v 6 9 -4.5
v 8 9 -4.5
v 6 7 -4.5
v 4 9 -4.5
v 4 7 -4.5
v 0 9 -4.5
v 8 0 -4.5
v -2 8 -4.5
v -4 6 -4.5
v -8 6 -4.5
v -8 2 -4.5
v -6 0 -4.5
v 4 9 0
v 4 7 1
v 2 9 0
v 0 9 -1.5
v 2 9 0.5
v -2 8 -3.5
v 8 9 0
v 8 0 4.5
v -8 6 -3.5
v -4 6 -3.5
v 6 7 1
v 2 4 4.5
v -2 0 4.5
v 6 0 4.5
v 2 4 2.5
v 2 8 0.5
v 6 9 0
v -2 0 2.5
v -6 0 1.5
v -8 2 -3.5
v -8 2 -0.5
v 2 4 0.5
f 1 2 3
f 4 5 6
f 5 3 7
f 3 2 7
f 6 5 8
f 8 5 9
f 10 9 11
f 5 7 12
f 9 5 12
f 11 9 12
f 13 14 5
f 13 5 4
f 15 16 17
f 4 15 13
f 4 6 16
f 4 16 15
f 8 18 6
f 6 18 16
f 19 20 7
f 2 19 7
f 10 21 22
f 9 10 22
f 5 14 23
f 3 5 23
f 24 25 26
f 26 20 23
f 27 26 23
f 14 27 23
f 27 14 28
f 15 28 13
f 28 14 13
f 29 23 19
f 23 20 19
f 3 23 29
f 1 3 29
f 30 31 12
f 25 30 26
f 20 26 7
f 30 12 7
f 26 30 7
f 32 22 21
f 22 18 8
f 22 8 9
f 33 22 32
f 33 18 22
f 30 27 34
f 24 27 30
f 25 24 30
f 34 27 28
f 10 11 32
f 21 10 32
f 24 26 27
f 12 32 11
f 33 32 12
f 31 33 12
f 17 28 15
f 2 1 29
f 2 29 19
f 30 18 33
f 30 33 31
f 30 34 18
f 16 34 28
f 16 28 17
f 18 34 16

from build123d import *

# Parameters (mm, degrees)
BOSS_EXTRUDE1_DEPTH = 9
SKETCH2_W           = 2
SKETCH2_H           = 2
CUT_EXTRUDE1_DEPTH  = 9
CUT_EXTRUDE2_DEPTH  = 8
CUT_EXTRUDE3_DEPTH  = 8
CUT_EXTRUDE4_DEPTH  = 8
CUT_EXTRUDE5_DEPTH  = 8


with BuildPart() as part:
    # Sketch1 → Boss-Extrude1 (new body)
    with BuildSketch(Plane(origin=(0, 0, 0), x_dir=(1, 0, 0), z_dir=(0, 1, 0))):
        Polygon((-8, 4.5), (-8, 0.5), (-6, -1.5), (-2, -2.5), (-2, -4.5), (8, -4.5), (8, 4.5), align=None)
    extrude(amount=BOSS_EXTRUDE1_DEPTH)

    # Sketch2 → Cut-Extrude1 (cut)
    with BuildSketch(Plane.XY.offset(4.5)):
        with Locations((5, 8)):
            Rectangle(SKETCH2_W, SKETCH2_H)
        Polygon((-8, 6), (-4, 6), (-2, 8), (0, 9), (-8, 9), align=None)
        Polygon((-8, 2), (-6, 0), (-8, 0), align=None)
    extrude(amount=-CUT_EXTRUDE1_DEPTH, mode=Mode.SUBTRACT)

    # Sketch4 → Cut-Extrude2 (cut)
    with BuildSketch(Plane.XY.offset(4.5)):
        Polygon((-4, 6), (-8, 2), (-8, 6), align=None)
    extrude(amount=-CUT_EXTRUDE2_DEPTH, mode=Mode.SUBTRACT)

    # 3DSketch1 → Cut-Extrude3 (cut, along a direction that is not the sketch's normal)
    with BuildSketch(Plane(origin=(8, 0, 4.5), x_dir=(-0.5121475197315839, 0.7682212795973759, -0.3841106397986879), z_dir=(0, -0.447213595499958, -0.894427190999916))):
        Polygon((0, 0), (1.024295039, -1.717795003), (6.913991516, -2.862991672), (11.715374514, 0), (8.642489395, 5.153385009), align=None)
    extrude(amount=-CUT_EXTRUDE3_DEPTH, dir=(0, 0, -1), mode=Mode.SUBTRACT)

    # 3DSketch2 → Cut-Extrude4 (cut, along a direction that is not the sketch's normal)
    with BuildSketch(Plane(origin=(-2, 0, 4.5), x_dir=(0.5773502691896258, 0.5773502691896258, -0.5773502691896257), z_dir=(0.7071067811865476, -0.7071067811865476, 0))):
        Polygon((0, 0), (4.618802154, 3.265986324), (6.92820323, 0), (1.154700538, -1.632993162), align=None)
    extrude(amount=-CUT_EXTRUDE4_DEPTH, dir=(0, -1, 0), mode=Mode.SUBTRACT)

    # 3DSketch3 → Cut-Extrude5 (cut, along a direction that is not the sketch's normal)
    with BuildSketch(Plane(origin=(-2, 8, -3.5), x_dir=(-0.3903600291794133, -0.7807200583588266, 0.48795003647426655), z_dir=(-0.19611613513818413, 0.5883484054145521, 0.7844645405527362))):
        Polygon((0, 0), (8.490330635, -2.985680109), (10.246950766, 0), (9.173460686, 3.980906812), (3.513240263, 5.971360218), align=None)
    extrude(amount=CUT_EXTRUDE5_DEPTH, dir=(0, 1, 0), mode=Mode.SUBTRACT)


solid = part.part
